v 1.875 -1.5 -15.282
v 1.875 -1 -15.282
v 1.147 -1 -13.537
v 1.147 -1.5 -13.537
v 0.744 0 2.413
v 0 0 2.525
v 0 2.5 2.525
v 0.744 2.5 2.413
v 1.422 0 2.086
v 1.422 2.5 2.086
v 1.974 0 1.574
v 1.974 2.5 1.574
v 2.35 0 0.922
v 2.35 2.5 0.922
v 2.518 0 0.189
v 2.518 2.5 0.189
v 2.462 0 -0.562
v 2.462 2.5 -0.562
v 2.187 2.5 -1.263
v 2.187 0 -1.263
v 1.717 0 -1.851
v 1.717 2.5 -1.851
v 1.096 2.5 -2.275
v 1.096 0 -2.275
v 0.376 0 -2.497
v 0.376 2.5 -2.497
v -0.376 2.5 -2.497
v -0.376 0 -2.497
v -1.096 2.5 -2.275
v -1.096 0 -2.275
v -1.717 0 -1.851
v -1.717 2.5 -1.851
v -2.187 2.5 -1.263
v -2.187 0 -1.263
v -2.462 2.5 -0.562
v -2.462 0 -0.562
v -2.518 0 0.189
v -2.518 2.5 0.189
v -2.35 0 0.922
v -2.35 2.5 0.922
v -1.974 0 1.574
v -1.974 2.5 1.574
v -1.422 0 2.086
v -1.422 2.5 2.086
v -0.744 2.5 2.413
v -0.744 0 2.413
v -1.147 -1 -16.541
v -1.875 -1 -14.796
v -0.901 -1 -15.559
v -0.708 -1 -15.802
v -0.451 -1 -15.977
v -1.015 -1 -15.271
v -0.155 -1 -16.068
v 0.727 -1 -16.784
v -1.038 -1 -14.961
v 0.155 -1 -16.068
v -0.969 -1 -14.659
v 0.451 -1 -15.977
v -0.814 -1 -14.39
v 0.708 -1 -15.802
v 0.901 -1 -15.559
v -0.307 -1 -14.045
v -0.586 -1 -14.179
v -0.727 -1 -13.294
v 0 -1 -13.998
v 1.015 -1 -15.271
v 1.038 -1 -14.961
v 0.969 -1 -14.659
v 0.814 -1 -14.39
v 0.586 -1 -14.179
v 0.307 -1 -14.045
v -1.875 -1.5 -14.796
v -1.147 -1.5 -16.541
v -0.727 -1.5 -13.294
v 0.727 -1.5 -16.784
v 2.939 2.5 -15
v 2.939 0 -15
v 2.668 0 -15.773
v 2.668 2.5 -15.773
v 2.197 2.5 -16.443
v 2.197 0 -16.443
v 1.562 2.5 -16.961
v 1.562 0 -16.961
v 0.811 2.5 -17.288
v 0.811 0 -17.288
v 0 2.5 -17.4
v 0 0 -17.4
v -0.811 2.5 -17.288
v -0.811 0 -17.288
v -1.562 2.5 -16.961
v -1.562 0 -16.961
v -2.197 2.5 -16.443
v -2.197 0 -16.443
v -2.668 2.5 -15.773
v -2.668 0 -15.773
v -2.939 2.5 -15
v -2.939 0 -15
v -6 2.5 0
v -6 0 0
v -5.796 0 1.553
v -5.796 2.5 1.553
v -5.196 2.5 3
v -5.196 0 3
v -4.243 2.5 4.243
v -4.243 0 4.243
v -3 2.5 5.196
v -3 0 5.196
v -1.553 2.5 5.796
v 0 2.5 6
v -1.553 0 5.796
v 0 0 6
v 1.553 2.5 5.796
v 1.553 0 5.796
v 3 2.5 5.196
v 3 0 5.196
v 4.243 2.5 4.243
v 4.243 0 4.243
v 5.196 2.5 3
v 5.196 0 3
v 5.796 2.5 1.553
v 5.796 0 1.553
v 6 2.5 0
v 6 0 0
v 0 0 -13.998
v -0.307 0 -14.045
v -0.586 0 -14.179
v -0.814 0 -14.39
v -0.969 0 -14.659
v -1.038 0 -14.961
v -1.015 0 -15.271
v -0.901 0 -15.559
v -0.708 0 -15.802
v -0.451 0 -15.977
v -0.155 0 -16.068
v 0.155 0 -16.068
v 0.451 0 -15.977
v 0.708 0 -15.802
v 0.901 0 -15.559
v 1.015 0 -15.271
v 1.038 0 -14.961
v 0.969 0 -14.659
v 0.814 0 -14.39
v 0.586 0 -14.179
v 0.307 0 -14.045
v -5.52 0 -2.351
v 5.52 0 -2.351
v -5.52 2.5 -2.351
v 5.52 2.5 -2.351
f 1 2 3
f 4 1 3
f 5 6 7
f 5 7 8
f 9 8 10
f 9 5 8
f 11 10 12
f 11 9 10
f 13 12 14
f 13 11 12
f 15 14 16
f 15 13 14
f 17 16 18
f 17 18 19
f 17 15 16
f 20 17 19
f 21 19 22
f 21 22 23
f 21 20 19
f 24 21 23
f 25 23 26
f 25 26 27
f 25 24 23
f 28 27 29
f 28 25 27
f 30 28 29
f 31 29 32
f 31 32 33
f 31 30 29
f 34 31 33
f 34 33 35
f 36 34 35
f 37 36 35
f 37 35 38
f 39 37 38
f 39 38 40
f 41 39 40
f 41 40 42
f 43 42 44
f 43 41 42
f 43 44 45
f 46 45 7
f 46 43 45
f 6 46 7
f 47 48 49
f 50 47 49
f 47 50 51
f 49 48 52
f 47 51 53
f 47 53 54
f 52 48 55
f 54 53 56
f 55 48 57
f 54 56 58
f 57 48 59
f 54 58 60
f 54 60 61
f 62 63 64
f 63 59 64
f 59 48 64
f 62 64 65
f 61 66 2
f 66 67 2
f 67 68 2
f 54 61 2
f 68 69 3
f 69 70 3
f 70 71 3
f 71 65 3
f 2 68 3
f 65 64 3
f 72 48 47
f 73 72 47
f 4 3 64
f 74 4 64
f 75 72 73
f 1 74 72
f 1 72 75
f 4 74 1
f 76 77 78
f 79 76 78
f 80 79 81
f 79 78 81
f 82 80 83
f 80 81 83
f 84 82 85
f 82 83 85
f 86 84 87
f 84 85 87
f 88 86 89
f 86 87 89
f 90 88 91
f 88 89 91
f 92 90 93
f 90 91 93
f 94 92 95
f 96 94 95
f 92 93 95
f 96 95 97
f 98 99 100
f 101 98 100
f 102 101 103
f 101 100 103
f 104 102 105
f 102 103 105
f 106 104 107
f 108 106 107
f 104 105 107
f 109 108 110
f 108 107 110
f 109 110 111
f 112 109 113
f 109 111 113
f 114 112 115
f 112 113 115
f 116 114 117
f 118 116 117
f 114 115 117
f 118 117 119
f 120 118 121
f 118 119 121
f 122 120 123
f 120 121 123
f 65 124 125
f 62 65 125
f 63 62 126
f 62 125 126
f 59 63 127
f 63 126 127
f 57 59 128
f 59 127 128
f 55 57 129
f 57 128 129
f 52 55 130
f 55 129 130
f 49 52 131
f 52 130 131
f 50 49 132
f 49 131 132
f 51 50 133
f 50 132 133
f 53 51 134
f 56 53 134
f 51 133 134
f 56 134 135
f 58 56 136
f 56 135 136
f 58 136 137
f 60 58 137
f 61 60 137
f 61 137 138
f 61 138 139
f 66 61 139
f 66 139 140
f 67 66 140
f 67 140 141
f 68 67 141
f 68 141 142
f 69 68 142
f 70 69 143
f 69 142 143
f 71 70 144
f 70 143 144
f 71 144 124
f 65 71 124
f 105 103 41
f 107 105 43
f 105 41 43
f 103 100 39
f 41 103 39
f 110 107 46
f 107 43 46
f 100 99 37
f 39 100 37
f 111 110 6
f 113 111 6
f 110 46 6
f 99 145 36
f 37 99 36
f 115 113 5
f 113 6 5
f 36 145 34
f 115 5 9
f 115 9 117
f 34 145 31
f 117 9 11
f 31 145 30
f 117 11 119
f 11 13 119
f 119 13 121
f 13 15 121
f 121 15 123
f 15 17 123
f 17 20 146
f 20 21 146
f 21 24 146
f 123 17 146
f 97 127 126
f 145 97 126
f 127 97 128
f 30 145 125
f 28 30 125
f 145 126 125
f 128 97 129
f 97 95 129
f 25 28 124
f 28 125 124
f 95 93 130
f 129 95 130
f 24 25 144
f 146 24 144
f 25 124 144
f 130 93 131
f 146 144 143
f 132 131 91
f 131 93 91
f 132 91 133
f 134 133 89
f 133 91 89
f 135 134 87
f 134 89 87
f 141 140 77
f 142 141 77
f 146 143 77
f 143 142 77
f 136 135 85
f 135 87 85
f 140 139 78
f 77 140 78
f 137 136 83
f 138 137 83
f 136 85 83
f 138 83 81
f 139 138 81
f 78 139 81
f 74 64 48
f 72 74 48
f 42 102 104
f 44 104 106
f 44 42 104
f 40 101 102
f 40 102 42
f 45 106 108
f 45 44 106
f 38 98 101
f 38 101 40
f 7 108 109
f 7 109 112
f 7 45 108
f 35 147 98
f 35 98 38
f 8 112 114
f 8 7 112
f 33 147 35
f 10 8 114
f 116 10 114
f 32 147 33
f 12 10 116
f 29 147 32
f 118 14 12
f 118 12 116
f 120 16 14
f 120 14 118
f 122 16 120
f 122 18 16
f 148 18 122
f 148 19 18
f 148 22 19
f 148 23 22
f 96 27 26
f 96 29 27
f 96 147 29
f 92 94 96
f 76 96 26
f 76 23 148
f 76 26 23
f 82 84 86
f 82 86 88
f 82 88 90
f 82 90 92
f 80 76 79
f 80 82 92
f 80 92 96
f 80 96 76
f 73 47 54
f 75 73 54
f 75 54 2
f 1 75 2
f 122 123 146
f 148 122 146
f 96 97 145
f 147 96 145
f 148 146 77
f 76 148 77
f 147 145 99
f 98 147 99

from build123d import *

# Parameters (mm, degrees)
SKETCH1_R           = 2.525
BOSS_EXTRUDE1_DEPTH = 2.5
SKETCH2_R           = 1.040591752
BOSS_EXTRUDE2_DEPTH = 1
BOSS_EXTRUDE3_DEPTH = 0.5


with BuildPart() as part:
    # Sketch1 → Boss-Extrude1 (new body)
    with BuildSketch(Plane(origin=(0, 0, 0), x_dir=(1, 0, 0), z_dir=(0, 1, 0))):
        with BuildLine():
            Line((-5.520391153, 2.350591738), (-6, 0))
            ThreePointArc((-6, 0), (0, -6), (6, 0))
            Line((6, 0), (5.520391153, 2.350591738))
            Line((5.520391153, 2.350591738), (2.939437593, 15))
            ThreePointArc((2.939437593, 15), (0, 17.40024452), (-2.939437593, 15))
            Line((-2.939437593, 15), (-5.520391153, 2.350591738))
        make_face()
        with Locations(Location((0, 0, 0), (0, 0, 270))):
            Circle(SKETCH1_R, mode=Mode.SUBTRACT)
    extrude(amount=BOSS_EXTRUDE1_DEPTH)

    # Sketch2 → Boss-Extrude2 (add)
    with BuildSketch(Plane.XZ):
        with Locations(Location((0, -15.039011309, 0), (0, 0, 90))):
            Circle(SKETCH2_R)
    extrude(amount=BOSS_EXTRUDE2_DEPTH)

    # Sketch3 → Boss-Extrude3 (add)
    with BuildSketch(Plane.XZ.offset(1)):
        Polygon((1.147373963, -13.536920287), (-0.727162002, -13.294310799), (-1.874535964, -14.79640182), (-1.147373963, -16.54110233), (0.727162002, -16.783711818), (1.874535964, -15.281620797), align=None)
    extrude(amount=BOSS_EXTRUDE3_DEPTH)


solid = part.part
